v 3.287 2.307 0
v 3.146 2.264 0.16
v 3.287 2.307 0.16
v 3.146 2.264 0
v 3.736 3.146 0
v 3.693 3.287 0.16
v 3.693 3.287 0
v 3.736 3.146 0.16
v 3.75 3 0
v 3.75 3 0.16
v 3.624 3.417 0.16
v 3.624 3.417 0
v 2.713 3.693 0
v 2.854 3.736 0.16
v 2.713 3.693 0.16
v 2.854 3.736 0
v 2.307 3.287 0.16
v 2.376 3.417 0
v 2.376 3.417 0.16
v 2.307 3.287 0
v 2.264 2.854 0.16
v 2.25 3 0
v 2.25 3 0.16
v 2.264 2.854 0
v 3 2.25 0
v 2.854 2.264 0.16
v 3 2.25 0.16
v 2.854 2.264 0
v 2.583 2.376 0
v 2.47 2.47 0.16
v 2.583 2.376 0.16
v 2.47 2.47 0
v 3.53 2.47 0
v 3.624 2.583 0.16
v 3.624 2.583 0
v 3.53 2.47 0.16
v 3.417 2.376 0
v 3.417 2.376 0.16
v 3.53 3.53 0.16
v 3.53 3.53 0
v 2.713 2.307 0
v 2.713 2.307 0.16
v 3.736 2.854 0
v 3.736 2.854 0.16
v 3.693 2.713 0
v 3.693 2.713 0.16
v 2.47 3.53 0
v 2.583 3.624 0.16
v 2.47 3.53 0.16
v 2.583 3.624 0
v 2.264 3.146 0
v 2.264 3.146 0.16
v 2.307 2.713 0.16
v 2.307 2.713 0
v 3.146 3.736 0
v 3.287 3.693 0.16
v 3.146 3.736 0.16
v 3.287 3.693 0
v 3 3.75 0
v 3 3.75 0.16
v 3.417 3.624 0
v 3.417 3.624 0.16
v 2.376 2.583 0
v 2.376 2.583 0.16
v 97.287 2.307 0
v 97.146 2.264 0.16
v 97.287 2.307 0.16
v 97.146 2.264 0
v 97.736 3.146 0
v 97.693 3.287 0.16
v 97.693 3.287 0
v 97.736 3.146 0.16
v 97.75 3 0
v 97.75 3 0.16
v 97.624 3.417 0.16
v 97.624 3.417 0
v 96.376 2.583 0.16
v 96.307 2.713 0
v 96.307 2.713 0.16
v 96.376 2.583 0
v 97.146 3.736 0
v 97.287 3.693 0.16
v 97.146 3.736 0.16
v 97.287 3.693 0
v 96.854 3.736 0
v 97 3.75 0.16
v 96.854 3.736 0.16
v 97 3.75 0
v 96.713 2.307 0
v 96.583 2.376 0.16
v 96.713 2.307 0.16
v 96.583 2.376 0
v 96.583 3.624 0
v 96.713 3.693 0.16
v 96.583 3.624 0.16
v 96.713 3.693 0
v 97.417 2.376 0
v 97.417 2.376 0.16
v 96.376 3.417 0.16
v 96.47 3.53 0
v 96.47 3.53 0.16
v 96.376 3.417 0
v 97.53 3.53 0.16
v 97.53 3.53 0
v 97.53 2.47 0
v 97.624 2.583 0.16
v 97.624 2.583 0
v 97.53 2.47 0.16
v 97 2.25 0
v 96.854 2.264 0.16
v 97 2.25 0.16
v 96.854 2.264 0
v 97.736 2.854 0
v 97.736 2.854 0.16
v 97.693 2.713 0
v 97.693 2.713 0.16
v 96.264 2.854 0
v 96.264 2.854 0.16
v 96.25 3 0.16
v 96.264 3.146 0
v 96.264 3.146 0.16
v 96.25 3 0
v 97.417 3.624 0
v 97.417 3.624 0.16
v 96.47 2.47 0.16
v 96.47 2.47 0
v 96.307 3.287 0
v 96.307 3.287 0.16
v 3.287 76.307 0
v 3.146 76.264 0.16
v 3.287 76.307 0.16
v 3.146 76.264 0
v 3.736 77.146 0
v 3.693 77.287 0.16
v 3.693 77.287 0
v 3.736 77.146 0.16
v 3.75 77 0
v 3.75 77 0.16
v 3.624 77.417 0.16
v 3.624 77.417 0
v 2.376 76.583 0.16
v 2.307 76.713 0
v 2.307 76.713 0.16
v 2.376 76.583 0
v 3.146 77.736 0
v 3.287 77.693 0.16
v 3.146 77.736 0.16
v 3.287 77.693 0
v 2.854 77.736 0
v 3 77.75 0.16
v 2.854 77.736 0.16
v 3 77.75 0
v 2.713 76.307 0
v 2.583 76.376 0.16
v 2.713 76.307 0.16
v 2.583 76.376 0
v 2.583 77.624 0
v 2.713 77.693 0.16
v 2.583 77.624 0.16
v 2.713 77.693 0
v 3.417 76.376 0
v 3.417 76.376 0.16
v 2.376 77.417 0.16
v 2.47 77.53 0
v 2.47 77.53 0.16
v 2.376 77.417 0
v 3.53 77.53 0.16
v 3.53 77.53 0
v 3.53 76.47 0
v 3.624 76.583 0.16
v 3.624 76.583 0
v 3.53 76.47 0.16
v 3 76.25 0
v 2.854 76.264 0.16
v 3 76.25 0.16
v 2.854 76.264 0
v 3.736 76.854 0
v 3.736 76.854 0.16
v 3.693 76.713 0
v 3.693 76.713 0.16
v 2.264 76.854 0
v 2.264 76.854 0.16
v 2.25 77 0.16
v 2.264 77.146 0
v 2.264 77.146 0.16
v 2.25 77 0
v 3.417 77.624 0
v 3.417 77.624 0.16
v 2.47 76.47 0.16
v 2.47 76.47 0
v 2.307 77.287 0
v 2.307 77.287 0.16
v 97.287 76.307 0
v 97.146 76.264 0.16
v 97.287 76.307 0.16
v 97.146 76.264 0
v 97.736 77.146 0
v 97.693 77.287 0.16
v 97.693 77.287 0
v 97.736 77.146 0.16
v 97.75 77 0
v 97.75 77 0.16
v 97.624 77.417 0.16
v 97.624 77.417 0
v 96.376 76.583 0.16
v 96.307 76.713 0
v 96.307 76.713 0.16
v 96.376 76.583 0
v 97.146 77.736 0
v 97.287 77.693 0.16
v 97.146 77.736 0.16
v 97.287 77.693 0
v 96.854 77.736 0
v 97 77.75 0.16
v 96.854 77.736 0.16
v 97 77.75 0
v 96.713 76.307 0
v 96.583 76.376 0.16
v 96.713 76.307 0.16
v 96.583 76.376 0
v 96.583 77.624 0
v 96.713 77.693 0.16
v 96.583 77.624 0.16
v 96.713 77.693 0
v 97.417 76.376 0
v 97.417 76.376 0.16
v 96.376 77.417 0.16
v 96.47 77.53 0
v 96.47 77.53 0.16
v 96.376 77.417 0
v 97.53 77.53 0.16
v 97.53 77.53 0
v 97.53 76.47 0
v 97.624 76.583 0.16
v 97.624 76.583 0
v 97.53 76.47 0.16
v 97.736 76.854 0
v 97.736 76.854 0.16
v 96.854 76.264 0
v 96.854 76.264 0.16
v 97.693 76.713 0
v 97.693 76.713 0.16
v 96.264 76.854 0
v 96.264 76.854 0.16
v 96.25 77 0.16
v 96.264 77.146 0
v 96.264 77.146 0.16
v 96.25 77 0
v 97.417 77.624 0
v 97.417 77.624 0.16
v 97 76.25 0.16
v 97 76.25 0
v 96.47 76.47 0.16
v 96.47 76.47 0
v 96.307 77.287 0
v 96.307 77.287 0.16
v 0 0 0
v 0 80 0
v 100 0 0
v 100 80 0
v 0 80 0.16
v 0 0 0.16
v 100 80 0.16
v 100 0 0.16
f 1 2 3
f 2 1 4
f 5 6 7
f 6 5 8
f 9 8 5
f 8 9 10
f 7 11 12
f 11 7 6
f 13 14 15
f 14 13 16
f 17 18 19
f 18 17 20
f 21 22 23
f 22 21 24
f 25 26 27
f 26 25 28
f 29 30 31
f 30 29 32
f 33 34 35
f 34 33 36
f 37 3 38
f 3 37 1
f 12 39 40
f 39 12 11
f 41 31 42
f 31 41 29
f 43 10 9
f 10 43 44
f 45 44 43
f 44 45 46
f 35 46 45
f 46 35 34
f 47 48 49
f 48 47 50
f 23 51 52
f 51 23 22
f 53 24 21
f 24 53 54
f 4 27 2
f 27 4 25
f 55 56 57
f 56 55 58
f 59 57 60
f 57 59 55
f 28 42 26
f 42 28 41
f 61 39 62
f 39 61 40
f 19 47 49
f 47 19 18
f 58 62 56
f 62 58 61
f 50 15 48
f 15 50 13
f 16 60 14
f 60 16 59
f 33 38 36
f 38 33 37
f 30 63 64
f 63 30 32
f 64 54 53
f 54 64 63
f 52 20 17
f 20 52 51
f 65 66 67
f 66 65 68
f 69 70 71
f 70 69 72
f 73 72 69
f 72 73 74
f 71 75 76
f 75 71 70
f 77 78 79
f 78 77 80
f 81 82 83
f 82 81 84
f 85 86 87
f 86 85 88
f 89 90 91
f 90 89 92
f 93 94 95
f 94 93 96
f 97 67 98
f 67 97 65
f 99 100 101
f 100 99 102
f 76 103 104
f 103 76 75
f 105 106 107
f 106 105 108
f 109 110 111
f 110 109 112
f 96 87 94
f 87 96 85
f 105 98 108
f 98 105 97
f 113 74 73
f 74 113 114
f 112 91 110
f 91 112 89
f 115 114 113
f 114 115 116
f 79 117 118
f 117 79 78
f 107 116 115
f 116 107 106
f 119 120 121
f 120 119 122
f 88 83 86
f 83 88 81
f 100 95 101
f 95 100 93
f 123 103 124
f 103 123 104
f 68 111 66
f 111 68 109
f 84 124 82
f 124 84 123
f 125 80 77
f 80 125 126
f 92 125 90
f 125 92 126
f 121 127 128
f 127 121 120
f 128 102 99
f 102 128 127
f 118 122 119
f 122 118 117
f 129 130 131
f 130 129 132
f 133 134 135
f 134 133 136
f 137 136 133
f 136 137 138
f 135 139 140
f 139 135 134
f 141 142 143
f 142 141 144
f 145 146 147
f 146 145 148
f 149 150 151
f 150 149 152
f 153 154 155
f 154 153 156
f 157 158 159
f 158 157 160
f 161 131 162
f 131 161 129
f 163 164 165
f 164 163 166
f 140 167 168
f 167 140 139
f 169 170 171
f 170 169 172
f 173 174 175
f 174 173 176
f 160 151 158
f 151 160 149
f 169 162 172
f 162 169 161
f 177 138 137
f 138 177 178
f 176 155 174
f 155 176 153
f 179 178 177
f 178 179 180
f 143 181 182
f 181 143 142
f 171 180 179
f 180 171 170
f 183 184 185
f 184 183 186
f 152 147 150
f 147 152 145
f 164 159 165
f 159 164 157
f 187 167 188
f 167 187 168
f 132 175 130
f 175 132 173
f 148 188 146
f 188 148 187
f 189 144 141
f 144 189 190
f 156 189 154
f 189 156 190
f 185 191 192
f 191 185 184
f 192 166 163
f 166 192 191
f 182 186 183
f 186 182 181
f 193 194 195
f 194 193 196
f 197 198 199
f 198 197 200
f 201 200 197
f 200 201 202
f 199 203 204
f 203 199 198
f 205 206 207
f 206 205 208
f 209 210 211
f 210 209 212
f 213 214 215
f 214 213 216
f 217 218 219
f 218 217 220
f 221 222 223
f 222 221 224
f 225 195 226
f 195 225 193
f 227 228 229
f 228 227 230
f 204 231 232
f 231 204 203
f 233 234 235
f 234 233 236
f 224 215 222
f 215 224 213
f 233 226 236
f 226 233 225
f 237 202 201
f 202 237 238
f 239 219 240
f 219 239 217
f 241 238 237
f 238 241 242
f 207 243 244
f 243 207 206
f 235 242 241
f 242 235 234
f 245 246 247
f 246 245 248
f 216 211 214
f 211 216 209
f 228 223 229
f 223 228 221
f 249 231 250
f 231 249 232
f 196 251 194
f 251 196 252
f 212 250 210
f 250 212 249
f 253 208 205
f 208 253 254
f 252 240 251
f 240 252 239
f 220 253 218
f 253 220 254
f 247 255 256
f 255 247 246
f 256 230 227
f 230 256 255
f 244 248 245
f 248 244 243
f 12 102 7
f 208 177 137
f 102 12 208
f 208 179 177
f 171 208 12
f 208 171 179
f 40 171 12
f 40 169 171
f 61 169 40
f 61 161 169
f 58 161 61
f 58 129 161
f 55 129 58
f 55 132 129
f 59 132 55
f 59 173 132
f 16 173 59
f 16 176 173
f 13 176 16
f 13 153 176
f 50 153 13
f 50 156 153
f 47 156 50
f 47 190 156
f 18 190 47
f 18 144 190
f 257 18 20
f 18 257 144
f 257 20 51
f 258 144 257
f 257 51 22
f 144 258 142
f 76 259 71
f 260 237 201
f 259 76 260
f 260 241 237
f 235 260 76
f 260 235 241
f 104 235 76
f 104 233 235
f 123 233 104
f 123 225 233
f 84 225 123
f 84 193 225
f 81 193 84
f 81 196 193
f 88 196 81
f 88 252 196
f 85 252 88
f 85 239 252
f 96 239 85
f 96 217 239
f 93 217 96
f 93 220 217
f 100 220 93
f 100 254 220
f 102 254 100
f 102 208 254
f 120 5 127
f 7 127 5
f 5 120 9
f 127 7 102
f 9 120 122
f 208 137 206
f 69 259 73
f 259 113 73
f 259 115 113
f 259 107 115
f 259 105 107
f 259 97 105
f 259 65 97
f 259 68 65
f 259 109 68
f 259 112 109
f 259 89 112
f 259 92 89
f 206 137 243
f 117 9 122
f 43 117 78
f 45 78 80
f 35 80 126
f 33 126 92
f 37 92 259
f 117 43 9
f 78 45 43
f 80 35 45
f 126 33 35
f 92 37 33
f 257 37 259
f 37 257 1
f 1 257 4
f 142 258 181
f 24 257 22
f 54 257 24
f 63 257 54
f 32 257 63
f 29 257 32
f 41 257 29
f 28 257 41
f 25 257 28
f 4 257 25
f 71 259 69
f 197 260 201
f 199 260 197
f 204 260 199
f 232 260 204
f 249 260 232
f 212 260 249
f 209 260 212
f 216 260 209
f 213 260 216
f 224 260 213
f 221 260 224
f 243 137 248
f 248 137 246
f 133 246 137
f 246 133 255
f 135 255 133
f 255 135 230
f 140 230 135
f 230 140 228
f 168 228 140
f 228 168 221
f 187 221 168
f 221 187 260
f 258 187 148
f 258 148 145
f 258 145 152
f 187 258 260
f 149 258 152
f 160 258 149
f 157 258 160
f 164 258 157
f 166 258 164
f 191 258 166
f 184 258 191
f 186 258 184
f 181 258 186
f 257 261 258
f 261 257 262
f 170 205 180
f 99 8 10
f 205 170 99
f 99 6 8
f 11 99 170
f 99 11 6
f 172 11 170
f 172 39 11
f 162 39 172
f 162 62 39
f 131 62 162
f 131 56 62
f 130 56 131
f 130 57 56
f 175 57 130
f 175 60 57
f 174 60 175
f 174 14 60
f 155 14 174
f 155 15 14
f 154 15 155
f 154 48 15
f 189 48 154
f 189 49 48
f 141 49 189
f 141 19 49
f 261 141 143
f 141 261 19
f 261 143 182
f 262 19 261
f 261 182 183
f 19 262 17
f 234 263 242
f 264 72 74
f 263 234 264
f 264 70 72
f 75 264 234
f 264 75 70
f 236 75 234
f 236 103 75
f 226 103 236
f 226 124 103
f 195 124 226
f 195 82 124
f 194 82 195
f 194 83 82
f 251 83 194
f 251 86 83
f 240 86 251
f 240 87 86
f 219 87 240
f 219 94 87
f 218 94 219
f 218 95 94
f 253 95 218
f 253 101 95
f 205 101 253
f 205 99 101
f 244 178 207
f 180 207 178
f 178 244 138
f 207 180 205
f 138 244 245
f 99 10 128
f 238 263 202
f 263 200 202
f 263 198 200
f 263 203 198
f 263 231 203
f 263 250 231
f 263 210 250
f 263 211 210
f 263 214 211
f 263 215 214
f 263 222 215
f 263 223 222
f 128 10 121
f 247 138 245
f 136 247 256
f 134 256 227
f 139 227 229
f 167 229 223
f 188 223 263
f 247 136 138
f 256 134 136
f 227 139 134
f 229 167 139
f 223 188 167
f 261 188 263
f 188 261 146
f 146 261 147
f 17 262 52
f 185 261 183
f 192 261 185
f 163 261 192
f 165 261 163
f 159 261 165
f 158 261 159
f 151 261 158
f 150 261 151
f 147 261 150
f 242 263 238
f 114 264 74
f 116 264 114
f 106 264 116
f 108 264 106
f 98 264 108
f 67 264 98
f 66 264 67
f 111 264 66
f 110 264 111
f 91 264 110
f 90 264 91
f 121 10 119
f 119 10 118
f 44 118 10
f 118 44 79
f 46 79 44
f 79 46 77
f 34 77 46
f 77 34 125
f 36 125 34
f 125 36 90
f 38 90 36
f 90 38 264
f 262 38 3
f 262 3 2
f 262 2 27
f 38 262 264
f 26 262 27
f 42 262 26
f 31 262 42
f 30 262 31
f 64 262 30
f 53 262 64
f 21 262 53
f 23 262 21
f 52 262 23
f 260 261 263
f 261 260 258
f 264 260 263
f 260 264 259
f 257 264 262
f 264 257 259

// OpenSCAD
// KiCad Stencil 3DP - OpenSCAD stencil generator
// Compatible with DXF2STENCIL workflow
// Parameters can be overridden with: openscad -D 'param=value'

source    = "paste.dxf";  // path to F.Paste DXF
width     = 100;           // mm board width
height    = 80;            // mm board height
thickness = 0.16;          // mm stencil thickness
offset    = 0.1;           // mm aperture expansion (positive=expand, negative=shrink)

// Registration pin holes (set pin_dia=0 to disable)
pin_dia    = 1.5;  // mm pin hole diameter
pin_margin = 3.0;  // mm offset from board edge

module pin_holes() {
    if (pin_dia > 0) {
        positions = [
            [pin_margin,         pin_margin],
            [width - pin_margin, pin_margin],
            [pin_margin,         height - pin_margin],
            [width - pin_margin, height - pin_margin]
        ];
        for (p = positions)
            translate([p[0], p[1], -0.01])
                cylinder(h = thickness + 0.02, d = pin_dia, $fn = 32);
    }
}

difference() {
    // Stencil base plate
    linear_extrude(height = thickness)
        square([width, height]);

    // Paste apertures: import DXF, expand by offset, extrude through stencil
    translate([0, 0, -0.01])
    linear_extrude(height = thickness + 0.02)
        offset(r = offset)
            import(source, center = false);

    // Registration pin holes at board corners
    pin_holes();
}
